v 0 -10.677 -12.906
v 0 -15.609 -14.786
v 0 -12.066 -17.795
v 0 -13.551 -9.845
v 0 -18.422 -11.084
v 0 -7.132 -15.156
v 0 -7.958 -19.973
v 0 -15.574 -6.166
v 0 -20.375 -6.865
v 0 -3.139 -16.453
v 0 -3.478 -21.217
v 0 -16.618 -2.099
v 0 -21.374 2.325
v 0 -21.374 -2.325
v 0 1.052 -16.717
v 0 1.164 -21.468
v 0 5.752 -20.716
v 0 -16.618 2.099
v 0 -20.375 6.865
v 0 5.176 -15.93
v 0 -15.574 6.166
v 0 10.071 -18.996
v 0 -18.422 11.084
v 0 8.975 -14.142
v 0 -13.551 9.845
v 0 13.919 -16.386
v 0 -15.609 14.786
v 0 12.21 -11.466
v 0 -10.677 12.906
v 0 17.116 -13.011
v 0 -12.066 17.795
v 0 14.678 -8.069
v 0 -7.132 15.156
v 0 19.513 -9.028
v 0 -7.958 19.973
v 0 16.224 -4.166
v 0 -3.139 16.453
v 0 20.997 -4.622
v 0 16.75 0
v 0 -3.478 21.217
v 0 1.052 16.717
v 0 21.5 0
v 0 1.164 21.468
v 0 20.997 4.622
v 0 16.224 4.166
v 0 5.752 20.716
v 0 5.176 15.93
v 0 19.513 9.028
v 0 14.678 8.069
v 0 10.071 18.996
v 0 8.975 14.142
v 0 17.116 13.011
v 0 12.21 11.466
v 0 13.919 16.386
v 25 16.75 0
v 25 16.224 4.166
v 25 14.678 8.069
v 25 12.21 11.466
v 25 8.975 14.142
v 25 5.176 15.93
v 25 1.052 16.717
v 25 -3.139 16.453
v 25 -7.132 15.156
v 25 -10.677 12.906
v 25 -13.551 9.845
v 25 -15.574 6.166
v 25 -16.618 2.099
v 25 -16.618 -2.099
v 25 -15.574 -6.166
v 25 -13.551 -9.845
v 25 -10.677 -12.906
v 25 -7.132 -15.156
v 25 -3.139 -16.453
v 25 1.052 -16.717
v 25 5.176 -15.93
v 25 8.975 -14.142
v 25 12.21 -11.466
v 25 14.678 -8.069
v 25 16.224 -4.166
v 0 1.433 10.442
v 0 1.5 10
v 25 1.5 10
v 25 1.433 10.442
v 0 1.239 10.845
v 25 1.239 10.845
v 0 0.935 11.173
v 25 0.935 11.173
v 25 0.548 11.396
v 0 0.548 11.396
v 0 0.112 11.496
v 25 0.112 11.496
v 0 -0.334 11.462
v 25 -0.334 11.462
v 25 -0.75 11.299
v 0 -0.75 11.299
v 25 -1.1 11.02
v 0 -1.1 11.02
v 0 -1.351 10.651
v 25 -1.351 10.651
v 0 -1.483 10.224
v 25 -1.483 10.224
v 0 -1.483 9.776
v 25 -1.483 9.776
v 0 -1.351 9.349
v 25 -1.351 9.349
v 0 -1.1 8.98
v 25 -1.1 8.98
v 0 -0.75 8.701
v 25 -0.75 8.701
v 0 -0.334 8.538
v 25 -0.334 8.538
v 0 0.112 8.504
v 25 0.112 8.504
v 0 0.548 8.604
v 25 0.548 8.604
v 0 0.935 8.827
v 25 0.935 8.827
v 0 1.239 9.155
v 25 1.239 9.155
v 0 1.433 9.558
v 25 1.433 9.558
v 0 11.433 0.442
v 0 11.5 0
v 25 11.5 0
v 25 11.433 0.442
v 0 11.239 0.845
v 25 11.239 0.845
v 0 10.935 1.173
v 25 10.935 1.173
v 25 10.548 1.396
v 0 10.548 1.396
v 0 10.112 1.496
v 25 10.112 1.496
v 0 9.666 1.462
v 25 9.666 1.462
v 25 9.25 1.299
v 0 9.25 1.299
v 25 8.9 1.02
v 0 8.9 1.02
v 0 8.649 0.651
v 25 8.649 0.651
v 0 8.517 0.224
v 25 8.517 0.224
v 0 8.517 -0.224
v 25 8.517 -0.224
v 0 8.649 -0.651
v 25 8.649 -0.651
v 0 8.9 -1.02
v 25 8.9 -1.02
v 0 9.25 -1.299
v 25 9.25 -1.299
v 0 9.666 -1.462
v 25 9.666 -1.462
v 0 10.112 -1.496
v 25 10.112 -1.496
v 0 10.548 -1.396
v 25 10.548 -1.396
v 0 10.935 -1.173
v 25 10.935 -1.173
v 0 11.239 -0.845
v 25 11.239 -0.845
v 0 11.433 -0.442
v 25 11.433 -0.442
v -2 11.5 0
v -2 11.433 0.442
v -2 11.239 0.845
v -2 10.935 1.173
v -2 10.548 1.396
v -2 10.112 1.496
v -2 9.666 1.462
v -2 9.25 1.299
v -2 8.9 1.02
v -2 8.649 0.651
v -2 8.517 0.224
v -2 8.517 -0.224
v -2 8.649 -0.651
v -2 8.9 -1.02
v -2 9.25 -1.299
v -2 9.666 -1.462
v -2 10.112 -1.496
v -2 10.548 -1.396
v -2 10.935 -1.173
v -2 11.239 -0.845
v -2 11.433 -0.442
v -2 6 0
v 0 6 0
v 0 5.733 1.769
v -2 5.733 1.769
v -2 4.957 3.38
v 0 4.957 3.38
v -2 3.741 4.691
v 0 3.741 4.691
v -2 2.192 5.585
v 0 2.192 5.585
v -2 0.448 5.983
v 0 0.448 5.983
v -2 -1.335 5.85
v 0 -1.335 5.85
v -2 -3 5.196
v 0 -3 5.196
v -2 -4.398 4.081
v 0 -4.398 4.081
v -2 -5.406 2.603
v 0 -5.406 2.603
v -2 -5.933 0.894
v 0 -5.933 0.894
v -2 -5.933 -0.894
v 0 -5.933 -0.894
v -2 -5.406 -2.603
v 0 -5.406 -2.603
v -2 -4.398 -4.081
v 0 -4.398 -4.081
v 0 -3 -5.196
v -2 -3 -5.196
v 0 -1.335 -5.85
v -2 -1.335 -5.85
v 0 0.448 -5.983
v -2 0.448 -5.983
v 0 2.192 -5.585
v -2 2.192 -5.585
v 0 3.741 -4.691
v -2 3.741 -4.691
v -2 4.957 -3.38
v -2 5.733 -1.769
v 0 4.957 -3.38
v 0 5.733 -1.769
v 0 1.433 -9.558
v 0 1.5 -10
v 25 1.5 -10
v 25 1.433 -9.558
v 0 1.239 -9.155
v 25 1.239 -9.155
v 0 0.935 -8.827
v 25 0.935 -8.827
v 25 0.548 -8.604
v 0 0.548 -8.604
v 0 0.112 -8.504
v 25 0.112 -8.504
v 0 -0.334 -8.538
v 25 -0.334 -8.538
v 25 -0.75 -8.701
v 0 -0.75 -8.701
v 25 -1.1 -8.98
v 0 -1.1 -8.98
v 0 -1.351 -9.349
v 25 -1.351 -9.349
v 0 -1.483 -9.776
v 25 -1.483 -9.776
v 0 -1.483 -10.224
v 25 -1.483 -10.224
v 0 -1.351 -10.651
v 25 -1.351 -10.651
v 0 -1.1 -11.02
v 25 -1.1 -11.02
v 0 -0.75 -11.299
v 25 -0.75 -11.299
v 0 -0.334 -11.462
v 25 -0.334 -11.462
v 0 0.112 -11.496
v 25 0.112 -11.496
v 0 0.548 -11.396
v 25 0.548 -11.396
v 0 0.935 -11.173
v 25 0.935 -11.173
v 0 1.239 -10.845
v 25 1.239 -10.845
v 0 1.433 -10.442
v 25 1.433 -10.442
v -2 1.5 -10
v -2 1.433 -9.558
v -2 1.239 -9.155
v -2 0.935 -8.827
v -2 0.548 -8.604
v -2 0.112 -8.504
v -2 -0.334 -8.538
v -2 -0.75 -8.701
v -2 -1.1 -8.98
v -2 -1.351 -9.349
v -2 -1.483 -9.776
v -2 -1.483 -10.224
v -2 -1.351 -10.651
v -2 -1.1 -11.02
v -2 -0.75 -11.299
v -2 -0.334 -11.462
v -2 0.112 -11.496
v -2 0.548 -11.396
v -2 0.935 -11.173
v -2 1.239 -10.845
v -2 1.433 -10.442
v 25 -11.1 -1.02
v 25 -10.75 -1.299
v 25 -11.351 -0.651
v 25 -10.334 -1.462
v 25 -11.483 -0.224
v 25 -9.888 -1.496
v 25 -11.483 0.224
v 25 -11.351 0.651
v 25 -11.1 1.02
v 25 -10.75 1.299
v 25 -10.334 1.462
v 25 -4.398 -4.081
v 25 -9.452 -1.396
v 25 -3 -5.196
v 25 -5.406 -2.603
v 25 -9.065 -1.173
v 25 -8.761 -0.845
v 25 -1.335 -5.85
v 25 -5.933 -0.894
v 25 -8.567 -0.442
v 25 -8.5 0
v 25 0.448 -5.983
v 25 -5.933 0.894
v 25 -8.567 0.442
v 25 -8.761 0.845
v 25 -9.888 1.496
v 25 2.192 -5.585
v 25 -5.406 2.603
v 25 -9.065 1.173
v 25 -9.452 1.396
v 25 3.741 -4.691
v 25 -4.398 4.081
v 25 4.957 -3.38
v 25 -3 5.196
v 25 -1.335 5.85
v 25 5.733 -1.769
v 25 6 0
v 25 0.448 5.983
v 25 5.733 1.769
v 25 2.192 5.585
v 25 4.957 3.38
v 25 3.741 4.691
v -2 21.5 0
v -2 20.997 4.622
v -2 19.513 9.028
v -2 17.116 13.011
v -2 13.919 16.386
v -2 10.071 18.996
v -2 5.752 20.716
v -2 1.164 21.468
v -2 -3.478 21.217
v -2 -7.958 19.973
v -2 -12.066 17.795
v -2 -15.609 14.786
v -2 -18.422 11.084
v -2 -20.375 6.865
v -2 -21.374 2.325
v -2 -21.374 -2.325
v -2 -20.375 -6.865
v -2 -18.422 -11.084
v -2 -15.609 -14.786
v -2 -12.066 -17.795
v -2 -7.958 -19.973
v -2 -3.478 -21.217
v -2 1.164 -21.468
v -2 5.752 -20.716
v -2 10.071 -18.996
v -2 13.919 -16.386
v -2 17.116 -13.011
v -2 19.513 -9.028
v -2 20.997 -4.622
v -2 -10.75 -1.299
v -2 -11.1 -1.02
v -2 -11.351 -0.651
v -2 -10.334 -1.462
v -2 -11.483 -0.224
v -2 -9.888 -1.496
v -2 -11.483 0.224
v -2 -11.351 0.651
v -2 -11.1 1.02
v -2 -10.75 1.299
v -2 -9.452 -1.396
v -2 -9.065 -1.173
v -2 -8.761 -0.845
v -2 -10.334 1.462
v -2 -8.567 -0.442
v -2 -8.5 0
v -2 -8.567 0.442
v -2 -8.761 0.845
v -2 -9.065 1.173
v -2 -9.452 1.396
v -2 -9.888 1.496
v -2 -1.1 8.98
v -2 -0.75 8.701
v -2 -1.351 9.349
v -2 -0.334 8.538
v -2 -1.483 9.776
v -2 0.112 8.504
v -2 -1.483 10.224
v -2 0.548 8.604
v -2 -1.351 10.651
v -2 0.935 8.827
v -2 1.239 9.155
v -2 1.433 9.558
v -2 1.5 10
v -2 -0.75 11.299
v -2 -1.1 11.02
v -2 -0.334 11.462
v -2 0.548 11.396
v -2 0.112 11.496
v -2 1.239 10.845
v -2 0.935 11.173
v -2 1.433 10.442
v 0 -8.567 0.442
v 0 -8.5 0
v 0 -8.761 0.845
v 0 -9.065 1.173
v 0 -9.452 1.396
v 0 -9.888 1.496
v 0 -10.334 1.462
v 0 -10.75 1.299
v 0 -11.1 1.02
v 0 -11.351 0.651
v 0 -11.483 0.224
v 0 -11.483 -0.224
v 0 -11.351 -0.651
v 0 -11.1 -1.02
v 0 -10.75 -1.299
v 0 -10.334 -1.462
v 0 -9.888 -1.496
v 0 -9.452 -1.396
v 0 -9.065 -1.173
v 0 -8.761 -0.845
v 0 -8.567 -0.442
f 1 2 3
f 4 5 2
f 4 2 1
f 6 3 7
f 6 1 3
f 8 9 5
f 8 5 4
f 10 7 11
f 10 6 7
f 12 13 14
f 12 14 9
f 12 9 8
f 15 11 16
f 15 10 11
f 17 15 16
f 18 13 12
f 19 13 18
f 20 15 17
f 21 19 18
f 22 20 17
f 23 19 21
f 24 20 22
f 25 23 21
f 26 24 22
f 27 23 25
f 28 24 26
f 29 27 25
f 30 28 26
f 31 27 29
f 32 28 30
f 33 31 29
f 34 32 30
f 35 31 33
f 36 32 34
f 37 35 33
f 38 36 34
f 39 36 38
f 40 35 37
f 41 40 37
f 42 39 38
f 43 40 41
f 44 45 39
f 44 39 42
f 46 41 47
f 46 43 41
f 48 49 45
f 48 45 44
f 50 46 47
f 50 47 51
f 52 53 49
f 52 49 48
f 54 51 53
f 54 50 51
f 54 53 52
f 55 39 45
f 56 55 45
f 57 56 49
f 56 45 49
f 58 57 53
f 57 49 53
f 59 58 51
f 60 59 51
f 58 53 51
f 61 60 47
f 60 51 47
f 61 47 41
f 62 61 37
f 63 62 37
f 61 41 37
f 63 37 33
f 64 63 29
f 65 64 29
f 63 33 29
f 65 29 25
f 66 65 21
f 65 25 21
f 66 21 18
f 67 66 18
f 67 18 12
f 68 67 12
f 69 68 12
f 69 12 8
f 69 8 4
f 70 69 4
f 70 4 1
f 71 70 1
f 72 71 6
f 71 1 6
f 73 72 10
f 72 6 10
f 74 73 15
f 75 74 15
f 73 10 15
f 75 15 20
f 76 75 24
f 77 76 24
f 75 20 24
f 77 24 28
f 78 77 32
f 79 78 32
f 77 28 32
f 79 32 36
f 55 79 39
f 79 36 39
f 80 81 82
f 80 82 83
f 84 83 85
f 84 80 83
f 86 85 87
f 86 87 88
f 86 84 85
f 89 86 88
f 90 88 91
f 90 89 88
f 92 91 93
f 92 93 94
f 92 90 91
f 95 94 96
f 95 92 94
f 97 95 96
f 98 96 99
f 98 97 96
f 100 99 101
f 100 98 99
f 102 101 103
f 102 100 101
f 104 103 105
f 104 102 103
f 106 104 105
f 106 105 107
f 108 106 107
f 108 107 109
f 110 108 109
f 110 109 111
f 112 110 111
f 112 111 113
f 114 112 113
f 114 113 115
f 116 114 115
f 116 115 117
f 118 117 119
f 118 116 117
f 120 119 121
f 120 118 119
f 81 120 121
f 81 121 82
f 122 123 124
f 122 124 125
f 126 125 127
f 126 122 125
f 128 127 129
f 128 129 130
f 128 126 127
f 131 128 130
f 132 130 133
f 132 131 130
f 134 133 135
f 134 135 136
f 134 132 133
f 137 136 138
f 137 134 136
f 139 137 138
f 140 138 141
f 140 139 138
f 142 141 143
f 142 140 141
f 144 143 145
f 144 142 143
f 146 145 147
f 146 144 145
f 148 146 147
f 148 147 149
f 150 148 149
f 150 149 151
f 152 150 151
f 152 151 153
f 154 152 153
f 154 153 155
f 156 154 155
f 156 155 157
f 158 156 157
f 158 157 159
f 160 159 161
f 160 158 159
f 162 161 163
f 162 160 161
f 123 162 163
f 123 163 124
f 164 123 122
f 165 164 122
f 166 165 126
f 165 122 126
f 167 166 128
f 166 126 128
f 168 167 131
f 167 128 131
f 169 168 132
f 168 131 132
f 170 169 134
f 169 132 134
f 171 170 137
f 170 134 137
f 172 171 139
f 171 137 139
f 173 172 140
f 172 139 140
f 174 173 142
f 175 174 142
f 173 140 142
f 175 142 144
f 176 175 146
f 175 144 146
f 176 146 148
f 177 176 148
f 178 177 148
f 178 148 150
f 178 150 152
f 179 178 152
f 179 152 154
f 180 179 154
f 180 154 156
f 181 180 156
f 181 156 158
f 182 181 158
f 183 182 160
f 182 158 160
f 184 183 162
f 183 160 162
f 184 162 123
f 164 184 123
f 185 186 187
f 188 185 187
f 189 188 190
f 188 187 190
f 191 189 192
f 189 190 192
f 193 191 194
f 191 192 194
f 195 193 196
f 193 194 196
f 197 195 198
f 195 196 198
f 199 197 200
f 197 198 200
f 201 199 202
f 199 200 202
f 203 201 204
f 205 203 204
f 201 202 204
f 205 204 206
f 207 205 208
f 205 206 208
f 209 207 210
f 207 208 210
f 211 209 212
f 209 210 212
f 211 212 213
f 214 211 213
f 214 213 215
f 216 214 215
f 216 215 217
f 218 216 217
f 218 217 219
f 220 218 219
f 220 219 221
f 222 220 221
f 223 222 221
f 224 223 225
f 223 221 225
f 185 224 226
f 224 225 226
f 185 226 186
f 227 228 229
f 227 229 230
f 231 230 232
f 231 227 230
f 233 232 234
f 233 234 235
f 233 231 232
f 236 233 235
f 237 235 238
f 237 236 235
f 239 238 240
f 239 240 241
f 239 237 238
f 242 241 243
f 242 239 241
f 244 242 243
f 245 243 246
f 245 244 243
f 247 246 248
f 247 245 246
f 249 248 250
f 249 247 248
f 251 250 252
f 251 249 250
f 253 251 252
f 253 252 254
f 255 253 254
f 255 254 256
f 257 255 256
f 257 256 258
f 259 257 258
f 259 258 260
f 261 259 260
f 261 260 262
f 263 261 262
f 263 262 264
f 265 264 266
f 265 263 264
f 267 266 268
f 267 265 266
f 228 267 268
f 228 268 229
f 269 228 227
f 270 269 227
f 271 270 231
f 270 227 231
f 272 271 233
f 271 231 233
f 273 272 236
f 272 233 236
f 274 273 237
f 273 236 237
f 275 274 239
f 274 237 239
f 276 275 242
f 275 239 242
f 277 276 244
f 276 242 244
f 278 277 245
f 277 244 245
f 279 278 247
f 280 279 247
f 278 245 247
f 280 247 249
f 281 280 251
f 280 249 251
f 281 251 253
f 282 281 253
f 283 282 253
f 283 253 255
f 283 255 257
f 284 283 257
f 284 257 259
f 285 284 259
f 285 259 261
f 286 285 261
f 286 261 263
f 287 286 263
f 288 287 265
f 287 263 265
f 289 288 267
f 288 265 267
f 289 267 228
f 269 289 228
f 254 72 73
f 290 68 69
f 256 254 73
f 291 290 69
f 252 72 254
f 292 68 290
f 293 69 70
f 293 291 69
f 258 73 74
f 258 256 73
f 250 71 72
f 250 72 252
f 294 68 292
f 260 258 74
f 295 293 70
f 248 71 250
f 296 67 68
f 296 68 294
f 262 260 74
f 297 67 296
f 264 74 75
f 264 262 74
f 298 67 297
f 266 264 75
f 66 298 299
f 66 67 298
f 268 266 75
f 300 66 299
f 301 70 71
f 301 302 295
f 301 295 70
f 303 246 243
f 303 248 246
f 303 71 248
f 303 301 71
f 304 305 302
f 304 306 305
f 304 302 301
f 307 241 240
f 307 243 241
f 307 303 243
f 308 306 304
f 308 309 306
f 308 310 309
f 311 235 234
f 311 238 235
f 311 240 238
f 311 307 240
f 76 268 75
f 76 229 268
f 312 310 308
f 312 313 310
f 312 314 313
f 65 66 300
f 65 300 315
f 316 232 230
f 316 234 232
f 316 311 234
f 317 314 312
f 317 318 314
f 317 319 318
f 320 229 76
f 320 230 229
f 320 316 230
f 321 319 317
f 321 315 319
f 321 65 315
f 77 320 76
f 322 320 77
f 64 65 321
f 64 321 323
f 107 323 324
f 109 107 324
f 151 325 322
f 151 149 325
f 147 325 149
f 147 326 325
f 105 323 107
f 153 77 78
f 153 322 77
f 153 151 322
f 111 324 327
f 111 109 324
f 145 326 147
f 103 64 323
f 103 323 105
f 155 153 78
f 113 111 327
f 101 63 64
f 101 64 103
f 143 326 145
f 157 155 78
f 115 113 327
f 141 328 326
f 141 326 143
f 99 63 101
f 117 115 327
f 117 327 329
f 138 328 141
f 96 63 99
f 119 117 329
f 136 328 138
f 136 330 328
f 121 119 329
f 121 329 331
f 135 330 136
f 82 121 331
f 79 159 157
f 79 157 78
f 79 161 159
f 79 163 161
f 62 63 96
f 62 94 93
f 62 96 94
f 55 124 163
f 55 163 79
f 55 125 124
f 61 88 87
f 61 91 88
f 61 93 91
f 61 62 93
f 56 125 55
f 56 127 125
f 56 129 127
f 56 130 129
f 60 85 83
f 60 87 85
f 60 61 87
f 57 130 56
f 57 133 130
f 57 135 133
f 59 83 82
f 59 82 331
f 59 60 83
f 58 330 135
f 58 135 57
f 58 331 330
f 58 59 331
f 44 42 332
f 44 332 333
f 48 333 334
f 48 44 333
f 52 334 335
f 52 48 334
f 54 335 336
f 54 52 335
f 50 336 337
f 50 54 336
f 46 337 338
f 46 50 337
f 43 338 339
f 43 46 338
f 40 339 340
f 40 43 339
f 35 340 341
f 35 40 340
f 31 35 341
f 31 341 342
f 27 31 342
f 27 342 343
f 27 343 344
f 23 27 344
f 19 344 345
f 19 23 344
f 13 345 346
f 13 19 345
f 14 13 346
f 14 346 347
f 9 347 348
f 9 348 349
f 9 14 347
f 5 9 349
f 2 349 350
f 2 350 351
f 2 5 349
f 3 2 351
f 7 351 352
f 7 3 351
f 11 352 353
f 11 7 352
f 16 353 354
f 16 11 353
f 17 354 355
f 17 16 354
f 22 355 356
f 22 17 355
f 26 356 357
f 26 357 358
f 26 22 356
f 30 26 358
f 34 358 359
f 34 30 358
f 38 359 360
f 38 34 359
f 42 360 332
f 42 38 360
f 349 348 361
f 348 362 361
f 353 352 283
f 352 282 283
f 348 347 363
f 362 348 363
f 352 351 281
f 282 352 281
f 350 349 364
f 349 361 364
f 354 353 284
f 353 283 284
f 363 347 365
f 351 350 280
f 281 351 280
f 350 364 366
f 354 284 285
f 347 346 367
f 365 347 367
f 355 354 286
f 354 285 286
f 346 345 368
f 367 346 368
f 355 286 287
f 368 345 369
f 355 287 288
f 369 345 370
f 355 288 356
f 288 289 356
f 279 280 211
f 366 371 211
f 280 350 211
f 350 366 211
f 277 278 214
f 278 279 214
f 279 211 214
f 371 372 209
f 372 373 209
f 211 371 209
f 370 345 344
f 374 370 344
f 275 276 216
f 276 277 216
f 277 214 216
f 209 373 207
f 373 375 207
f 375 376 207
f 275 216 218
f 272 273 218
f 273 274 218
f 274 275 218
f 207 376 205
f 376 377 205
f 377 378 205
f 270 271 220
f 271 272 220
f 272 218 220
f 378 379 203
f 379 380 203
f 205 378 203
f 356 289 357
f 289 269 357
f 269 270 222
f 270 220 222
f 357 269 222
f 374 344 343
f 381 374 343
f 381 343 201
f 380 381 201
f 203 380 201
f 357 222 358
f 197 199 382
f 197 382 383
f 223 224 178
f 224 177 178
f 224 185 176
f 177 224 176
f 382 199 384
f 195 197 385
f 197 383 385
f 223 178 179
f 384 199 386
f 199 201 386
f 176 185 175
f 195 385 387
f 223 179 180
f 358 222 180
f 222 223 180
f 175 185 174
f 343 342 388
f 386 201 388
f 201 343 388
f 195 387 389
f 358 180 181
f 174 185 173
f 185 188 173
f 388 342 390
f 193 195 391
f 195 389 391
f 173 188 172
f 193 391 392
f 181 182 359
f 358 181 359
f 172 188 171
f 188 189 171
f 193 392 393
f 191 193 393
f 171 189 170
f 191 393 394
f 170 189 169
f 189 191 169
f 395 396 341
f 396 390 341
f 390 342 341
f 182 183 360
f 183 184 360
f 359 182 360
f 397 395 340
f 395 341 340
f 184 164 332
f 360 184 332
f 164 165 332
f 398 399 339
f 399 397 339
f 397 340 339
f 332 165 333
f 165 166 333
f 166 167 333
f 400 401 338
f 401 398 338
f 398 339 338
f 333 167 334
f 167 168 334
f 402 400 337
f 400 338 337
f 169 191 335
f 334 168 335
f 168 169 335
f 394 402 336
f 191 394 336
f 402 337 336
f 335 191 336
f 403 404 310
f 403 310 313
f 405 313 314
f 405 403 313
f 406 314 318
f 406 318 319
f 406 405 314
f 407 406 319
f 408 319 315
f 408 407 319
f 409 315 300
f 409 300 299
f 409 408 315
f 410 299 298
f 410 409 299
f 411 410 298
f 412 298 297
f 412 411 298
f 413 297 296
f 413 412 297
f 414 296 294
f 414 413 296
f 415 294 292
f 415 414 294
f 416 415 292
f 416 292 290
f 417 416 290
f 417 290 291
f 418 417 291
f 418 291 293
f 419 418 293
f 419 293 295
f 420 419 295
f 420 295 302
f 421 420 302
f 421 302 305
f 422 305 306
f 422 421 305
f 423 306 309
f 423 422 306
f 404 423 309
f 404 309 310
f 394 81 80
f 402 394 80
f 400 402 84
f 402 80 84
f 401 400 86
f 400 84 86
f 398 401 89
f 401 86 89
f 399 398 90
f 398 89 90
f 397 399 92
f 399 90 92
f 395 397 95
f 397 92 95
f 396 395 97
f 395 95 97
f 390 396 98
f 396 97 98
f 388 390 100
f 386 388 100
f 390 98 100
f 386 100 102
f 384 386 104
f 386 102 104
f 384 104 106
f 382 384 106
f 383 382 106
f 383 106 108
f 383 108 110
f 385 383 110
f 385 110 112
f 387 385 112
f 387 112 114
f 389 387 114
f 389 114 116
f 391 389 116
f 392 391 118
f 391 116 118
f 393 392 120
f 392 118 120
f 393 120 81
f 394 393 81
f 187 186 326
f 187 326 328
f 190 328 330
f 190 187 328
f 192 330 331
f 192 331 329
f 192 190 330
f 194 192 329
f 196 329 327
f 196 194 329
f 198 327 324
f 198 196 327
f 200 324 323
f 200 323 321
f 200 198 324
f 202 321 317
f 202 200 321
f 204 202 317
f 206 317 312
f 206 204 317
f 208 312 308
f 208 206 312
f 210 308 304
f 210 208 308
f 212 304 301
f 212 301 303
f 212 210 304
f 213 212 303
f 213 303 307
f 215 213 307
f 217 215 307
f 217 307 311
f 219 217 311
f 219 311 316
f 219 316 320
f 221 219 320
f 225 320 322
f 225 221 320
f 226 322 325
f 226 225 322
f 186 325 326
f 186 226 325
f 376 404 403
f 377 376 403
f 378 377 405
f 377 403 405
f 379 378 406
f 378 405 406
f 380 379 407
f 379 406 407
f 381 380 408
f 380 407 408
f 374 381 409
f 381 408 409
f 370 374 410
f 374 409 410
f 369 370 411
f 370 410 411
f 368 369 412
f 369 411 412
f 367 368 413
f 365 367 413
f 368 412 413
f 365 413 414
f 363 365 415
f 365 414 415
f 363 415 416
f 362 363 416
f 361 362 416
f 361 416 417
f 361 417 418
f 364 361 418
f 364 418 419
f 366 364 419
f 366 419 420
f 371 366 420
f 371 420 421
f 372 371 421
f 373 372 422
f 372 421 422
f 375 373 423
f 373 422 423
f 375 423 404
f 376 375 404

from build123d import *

# Parameters (mm, degrees)
F0_R     = 16.75
F0_R_2   = 1.5
F0_R_3   = 6
F1_DEPTH = 25
F0_R_4   = 21.5
F2_DEPTH = 2


with BuildPart() as f1:
    # F0 (on Right) → F1 (new body)
    with BuildSketch(Plane.YZ):
        Circle(F0_R)
        with Locations((0, -10)):
            Circle(F0_R_2, mode=Mode.SUBTRACT)
        with Locations((-10, 0)):
            Circle(F0_R_2, mode=Mode.SUBTRACT)
        Circle(F0_R_3, mode=Mode.SUBTRACT)
        with Locations((10, 0)):
            Circle(F0_R_2, mode=Mode.SUBTRACT)
        with Locations((0, 10)):
            Circle(F0_R_2, mode=Mode.SUBTRACT)
    extrude(amount=F1_DEPTH)

    # F0 (on Right) → F2 (join)
    with BuildSketch(Plane.YZ):
        Circle(F0_R_4)
        Circle(F0_R, mode=Mode.SUBTRACT)
        Circle(F0_R)
        with Locations((0, -10)):
            Circle(F0_R_2, mode=Mode.SUBTRACT)
        with Locations((-10, 0)):
            Circle(F0_R_2, mode=Mode.SUBTRACT)
        Circle(F0_R_3, mode=Mode.SUBTRACT)
        with Locations((10, 0)):
            Circle(F0_R_2, mode=Mode.SUBTRACT)
        with Locations((0, 10)):
            Circle(F0_R_2, mode=Mode.SUBTRACT)
    extrude(amount=-F2_DEPTH)


solid = f1.part
